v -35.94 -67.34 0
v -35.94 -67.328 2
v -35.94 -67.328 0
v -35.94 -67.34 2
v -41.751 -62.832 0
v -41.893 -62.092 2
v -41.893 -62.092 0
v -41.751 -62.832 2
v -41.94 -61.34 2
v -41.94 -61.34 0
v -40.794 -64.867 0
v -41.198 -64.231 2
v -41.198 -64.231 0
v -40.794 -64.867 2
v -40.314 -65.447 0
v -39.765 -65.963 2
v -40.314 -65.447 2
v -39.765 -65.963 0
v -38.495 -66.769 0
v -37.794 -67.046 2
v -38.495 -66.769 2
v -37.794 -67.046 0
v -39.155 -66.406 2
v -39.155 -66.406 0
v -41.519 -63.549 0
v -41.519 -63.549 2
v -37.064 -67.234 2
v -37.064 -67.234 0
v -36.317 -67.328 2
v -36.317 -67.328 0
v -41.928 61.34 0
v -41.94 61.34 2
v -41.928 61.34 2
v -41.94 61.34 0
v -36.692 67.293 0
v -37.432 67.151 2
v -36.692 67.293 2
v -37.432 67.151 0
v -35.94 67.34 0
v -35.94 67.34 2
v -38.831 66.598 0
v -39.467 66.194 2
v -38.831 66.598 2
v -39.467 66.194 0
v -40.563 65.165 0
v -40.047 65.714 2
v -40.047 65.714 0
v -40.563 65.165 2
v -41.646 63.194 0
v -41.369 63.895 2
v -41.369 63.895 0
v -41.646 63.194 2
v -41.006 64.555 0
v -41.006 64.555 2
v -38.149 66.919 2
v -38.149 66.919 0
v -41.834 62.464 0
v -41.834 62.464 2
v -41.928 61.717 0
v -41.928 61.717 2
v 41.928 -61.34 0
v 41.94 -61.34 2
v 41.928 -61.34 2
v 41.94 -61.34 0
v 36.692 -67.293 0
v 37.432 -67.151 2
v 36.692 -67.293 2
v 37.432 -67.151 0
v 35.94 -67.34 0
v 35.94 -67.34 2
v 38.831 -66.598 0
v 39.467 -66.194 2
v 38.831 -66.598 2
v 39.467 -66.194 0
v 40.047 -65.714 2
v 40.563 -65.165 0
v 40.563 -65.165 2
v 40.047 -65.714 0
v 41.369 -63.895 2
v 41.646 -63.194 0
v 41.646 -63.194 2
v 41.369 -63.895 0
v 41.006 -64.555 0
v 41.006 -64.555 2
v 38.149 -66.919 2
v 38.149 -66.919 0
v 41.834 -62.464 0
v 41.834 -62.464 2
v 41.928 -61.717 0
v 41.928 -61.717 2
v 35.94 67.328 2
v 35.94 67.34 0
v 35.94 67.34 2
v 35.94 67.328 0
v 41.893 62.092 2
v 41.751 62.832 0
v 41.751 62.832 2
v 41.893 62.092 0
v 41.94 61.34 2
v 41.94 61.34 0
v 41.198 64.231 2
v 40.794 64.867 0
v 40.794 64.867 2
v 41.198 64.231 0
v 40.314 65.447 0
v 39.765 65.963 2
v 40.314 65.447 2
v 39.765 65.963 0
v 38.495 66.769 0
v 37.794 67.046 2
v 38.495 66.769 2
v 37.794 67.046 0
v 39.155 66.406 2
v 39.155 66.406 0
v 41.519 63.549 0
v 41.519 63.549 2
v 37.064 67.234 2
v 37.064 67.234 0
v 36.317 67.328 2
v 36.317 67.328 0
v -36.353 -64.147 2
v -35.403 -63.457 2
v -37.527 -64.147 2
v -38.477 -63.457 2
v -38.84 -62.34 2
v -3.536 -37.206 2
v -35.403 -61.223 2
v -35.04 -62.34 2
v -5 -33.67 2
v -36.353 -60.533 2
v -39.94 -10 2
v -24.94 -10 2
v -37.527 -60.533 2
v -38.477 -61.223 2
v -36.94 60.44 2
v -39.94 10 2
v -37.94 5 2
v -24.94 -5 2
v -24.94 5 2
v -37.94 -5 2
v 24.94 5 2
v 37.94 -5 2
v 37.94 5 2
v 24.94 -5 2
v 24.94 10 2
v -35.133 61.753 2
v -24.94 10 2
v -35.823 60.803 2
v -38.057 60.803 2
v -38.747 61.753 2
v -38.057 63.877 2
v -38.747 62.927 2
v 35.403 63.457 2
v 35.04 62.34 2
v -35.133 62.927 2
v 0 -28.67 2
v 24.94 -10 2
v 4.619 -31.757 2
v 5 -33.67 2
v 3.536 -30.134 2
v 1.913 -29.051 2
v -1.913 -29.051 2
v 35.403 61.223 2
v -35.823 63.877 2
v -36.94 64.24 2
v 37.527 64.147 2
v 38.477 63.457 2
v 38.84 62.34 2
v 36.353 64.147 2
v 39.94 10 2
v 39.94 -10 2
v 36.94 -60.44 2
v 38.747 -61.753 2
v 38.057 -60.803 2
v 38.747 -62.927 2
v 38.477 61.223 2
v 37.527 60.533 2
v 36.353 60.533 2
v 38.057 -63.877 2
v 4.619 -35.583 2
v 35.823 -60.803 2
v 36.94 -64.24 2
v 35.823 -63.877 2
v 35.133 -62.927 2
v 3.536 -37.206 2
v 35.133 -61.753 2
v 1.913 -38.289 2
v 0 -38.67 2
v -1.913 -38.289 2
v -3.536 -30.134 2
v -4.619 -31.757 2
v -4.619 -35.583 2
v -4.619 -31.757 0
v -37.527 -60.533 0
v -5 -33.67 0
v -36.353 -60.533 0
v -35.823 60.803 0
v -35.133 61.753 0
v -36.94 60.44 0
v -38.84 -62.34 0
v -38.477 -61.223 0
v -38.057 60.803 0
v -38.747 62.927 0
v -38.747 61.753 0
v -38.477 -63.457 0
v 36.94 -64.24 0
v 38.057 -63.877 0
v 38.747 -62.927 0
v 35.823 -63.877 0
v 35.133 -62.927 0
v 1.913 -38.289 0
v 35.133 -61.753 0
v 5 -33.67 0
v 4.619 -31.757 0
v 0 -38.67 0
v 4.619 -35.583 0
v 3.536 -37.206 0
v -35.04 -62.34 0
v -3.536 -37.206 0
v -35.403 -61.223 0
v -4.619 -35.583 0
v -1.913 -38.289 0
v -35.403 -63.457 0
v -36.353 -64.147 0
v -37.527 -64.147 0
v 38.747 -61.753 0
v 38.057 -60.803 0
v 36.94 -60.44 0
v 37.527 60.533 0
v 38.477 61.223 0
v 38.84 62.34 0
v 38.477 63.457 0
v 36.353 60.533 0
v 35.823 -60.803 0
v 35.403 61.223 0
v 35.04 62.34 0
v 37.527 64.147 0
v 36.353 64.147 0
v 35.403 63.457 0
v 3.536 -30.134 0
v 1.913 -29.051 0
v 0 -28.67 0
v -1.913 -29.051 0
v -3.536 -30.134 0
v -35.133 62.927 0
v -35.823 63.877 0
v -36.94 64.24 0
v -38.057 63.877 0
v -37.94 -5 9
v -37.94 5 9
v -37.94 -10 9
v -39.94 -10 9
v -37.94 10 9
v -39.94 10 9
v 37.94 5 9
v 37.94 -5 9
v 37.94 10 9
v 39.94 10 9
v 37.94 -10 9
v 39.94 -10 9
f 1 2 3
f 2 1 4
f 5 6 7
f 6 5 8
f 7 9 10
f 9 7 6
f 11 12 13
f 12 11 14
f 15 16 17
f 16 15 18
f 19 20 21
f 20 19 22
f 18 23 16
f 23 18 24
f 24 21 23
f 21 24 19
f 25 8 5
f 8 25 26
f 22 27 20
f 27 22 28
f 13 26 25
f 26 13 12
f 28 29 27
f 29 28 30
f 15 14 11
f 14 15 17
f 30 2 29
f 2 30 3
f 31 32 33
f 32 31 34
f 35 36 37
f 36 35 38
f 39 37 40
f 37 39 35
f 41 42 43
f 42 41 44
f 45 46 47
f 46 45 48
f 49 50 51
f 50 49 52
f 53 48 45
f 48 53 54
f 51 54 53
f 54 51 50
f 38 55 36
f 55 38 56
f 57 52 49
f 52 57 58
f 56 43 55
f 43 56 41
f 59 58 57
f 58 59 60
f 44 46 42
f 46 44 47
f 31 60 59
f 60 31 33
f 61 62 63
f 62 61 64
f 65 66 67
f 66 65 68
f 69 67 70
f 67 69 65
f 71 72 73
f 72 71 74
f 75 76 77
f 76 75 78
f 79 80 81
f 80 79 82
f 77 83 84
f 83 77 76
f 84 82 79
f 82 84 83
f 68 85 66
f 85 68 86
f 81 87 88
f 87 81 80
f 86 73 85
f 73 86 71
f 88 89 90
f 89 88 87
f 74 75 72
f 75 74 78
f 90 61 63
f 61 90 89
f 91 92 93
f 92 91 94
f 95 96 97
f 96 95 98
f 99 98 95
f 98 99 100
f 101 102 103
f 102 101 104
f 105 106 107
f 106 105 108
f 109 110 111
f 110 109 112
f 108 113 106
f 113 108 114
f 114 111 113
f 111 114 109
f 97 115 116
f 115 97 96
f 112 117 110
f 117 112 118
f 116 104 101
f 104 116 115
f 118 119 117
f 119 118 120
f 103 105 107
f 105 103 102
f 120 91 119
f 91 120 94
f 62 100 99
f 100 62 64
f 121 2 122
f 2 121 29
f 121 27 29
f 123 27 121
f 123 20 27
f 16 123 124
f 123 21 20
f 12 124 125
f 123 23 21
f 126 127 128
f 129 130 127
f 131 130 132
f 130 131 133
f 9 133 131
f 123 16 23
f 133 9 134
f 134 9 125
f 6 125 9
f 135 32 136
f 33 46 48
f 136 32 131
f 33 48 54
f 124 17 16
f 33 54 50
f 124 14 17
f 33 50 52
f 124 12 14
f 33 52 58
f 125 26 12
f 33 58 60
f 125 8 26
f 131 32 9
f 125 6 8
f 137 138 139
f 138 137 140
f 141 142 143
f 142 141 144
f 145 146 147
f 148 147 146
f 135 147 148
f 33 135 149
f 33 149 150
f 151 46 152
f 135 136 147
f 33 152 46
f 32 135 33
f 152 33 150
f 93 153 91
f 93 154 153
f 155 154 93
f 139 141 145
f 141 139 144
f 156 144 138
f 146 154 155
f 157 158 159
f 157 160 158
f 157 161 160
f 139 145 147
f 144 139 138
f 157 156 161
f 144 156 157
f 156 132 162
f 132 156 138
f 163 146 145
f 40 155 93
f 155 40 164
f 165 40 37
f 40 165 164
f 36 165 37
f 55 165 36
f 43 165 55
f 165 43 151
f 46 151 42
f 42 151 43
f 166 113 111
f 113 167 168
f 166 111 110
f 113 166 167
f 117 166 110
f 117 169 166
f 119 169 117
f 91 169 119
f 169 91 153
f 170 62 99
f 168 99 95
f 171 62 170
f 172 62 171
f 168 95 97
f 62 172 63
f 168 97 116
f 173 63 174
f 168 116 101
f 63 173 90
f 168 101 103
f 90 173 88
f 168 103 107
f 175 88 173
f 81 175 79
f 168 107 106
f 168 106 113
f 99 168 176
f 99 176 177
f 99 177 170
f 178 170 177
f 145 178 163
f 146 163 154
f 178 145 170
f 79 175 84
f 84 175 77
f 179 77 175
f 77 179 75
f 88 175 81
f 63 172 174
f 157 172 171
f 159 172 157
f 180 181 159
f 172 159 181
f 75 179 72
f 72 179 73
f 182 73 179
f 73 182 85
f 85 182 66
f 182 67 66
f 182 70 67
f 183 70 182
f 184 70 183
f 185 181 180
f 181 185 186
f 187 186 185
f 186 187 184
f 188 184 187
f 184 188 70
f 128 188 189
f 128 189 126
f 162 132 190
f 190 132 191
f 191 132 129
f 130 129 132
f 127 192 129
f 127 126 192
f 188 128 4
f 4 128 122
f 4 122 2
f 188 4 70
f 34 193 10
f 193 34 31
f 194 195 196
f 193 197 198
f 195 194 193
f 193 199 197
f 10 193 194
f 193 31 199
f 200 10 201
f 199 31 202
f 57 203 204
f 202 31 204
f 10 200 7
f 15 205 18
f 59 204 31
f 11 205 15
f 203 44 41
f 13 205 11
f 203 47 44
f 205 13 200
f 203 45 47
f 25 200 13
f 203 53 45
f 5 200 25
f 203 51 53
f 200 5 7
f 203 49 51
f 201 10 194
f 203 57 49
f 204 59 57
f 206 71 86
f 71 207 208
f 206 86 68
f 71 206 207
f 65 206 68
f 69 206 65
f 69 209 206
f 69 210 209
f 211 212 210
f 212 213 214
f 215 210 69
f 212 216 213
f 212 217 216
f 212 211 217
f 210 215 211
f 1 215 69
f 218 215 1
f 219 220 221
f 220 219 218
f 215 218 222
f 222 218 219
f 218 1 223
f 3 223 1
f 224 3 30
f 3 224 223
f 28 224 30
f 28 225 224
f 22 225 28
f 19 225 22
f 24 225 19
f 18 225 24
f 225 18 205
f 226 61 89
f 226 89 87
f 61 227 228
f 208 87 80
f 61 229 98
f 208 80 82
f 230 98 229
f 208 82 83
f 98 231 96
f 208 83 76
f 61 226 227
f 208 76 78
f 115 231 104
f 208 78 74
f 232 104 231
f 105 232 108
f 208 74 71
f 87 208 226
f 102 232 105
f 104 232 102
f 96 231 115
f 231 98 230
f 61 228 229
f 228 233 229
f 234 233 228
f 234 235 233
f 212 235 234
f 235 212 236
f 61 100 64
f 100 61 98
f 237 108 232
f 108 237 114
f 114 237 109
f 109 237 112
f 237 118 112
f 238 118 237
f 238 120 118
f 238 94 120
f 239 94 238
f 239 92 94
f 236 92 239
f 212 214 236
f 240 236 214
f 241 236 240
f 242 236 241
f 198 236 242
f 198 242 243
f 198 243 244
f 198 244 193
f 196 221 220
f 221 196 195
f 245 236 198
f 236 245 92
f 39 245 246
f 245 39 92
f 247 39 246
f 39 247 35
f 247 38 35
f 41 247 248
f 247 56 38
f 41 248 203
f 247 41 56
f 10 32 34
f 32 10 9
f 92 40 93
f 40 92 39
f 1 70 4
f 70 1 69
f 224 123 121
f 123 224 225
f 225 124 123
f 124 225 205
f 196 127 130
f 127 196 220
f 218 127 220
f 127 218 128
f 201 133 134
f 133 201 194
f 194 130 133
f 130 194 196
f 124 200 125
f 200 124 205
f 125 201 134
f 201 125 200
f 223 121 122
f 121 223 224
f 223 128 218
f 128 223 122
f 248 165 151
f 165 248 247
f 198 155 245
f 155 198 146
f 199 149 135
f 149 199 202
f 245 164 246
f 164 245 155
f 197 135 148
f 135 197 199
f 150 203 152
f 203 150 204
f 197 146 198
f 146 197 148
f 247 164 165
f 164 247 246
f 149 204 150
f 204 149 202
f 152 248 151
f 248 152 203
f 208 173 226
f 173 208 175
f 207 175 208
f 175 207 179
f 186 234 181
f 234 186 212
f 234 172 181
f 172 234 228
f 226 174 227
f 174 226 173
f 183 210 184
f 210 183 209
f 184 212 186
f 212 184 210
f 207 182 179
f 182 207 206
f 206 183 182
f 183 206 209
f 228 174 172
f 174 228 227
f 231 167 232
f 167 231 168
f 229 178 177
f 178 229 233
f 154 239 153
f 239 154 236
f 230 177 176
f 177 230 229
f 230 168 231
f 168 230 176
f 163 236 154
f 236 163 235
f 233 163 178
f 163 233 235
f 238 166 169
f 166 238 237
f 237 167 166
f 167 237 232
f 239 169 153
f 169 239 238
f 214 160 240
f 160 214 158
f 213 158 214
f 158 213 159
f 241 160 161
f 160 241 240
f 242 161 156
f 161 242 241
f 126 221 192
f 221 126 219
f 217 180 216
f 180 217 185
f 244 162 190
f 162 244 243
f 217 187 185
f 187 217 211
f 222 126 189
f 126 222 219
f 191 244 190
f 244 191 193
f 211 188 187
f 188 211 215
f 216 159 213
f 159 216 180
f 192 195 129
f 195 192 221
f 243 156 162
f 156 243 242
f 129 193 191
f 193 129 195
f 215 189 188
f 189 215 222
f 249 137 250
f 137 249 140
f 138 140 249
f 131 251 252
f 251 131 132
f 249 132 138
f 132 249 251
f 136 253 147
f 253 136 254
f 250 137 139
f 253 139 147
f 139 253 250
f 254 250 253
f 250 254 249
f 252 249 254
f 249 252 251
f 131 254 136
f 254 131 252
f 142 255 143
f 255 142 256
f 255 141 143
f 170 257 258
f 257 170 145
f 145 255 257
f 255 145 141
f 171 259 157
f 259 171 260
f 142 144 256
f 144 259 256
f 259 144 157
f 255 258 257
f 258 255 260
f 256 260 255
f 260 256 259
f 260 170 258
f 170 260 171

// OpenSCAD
// file: rounding.scad
/*
 Copyright (C) 2018 Karim Kanso. All Rights Reserved.

 This program is free software: you can redistribute it and/or modify
 it under the terms of the GNU General Public License as published by
 the Free Software Foundation, either version 3 of the License, or
 (at your option) any later version.

 This program is distributed in the hope that it will be useful,
 but WITHOUT ANY WARRANTY; without even the implied warranty of
 MERCHANTABILITY or FITNESS FOR A PARTICULAR PURPOSE.  See the
 GNU General Public License for more details.

 You should have received a copy of the GNU General Public License
 along with this program.  If not, see <http://www.gnu.org/licenses/>.
*/

module rounding(r,h) {
    difference() {
        cube([r+1, r+1, h+1]);
        translate([0,0,-1])
        cylinder(r=r, h=h+2);
    };
};

module rounded_cube(r,x) {
    difference() {
        cube(x);
        translate([r,r,-0.5])
        rotate([0,0,180])
            rounding(r,x[2]);
        translate([r,x[1] - r,-0.5])
        rotate([0,0,90])
            rounding(r,x[2]);
        translate([x[0] - r,r,-0.5])
        rotate([0,0,270])
            rounding(r,x[2]);
        translate([x[0] - r, x[1] - r,-0.5])
            rounding(r,x[2]);
    };
};
// main file
/*
 Copyright (C) 2018 Karim Kanso. All Rights Reserved.

 This program is free software: you can redistribute it and/or modify
 it under the terms of the GNU General Public License as published by
 the Free Software Foundation, either version 3 of the License, or
 (at your option) any later version.

 This program is distributed in the hope that it will be useful,
 but WITHOUT ANY WARRANTY; without even the implied warranty of
 MERCHANTABILITY or FITNESS FOR A PARTICULAR PURPOSE.  See the
 GNU General Public License for more details.

 You should have received a copy of the GNU General Public License
 along with this program.  If not, see <http://www.gnu.org/licenses/>.
*/

include <rounding.scad>

// set to true/false to show lid or case
makelid = true;

hobs_wide = 10;
hobs_deep = 20;
hob_radius = 1.65;
hob_spacing = 5.08;

plane_width = (hobs_wide+1)*hob_spacing;
plane_depth = (hobs_deep+1)*hob_spacing;

plane_height = 2;

oversize=12;
wall_width=2;

internal_height=60-plane_height;

module case() {
    difference() {
        rounded_cube(6, [plane_width+oversize*2+wall_width*2,plane_depth+oversize*2+wall_width*2,plane_height+internal_height], $fn=50);
        translate([wall_width,wall_width,plane_height])
            cube(size = [plane_width+oversize*2,plane_depth+oversize*2,internal_height+1]);

        translate([oversize+wall_width,oversize+wall_width,0])
        for (i = [1 : hobs_wide]) {
            for (j = [1 : hobs_deep]) {
                translate([i*hob_spacing, j*hob_spacing, -1])
                    cylinder(r1 = hob_radius,r2 = hob_radius,$fn = 12,h = plane_height+2, center=false);
            }
        }
    }
};

corner_width=12;

m3_diameter = 3.6;
m3_nut_diameter = 5.3;
m3_nut_diameter_horizontal = 6.1;
m3_nut_height = 2.2;
nut_height = m3_nut_height + 0.25;

points = [
  [0,0,0],
  [corner_width,0,0],
  [0,corner_width,0],
  [0,0,internal_height],
  [corner_width,0,internal_height],
  [0,corner_width,internal_height],
];

faces = [
  [0,1,2],
  [0,3,4,1],
  [0,2,5,3],
  [1,4,5,2],
  [3,5,4]
];

module corner() {
    difference() {
        polyhedron(points,faces);
        translate([corner_width/4,corner_width/4,plane_height])
            cylinder(h = internal_height+2, r=m3_diameter/2 + 0.1, $fn=10);
#        translate([corner_width/4,corner_width/4, internal_height - 5])
        rotate([0,0,-15])
            cylinder(h = nut_height, r=m3_nut_diameter_horizontal/2, $fn=6);
#        translate([corner_width/4 + sin(45) * 3, corner_width/4 + sin(45) * 3, internal_height - 0.25 - 5])
        rotate([0,0,-15])
            cylinder(h = nut_height + 0.5, r=m3_nut_diameter_horizontal/2 + 0.5, $fn=6);
    };
};


module bottom() {
    case();
    translate([wall_width,wall_width,plane_height])
        corner();

    translate([wall_width,plane_depth+oversize*2+wall_width,plane_height])
        rotate(270)
        corner();
    translate([plane_width+oversize*2+wall_width,wall_width,plane_height])
        rotate(90)
        corner();
    translate([plane_width+oversize*2+wall_width,plane_depth+oversize*2+wall_width,plane_height])
        rotate(180)
        corner();
};

tee_width = 20;
tee_height = 7;
tee_depth = 15;
tee_support_width = 5;

tee_angle = atan(tee_height/(tee_depth-wall_width));
tee_depth_alt = tee_height/sin(tee_angle);
module tee() {
    union() {
        cube([wall_width,tee_width,tee_height]);

        for (y = [0,tee_width -tee_support_width]) {
            translate([wall_width,y,0])
            difference() {
                cube([tee_depth-wall_width,tee_support_width,tee_height]);

                translate([tee_depth-wall_width,0,0])
                    rotate([0,tee_angle,0])
                    translate([-tee_depth_alt,-1,0])
                    cube([tee_depth_alt,tee_support_width+2,tee_height]);
            };
        };
    };
};

module lidcorner() {
    translate([corner_width/4,corner_width/4,-1])
            cylinder(h = plane_height+2, r=m3_diameter/2 + 0.1, $fn=10);
}

module lid() {
    difference() {
        rounded_cube(6, [plane_width+oversize*2+wall_width*2,plane_depth+oversize*2+wall_width*2,plane_height], $fn=50);
        translate([wall_width,wall_width,0])
            lidcorner();

        translate([wall_width,plane_depth+oversize*2+wall_width,0])
            rotate(270)
            lidcorner();
        translate([plane_width+oversize*2+wall_width,wall_width,0])
            rotate(90)
            lidcorner();
        translate([plane_width+oversize*2+wall_width,plane_depth+oversize*2+wall_width,0])
            rotate(180)
            lidcorner();
        //cable hole
        translate([plane_width/2+oversize+wall_width,plane_depth/4+oversize/2+wall_width/2,-1])
        cylinder(r=5, h=plane_height+2);
    };
    translate([wall_width,plane_depth/2+oversize+wall_width-tee_width/2,plane_height])
        tee();
    translate([plane_width+oversize*2+wall_width*2-wall_width,plane_depth/2+oversize+wall_width-tee_width/2+tee_width,plane_height])
        rotate(180)
        tee();
};

translate([-(plane_width/2)-oversize-wall_width,
           -(plane_depth/2)-oversize-wall_width,
           0]) {
    if (makelid) {
        lid();
    } else {
        bottom();
    }
};
